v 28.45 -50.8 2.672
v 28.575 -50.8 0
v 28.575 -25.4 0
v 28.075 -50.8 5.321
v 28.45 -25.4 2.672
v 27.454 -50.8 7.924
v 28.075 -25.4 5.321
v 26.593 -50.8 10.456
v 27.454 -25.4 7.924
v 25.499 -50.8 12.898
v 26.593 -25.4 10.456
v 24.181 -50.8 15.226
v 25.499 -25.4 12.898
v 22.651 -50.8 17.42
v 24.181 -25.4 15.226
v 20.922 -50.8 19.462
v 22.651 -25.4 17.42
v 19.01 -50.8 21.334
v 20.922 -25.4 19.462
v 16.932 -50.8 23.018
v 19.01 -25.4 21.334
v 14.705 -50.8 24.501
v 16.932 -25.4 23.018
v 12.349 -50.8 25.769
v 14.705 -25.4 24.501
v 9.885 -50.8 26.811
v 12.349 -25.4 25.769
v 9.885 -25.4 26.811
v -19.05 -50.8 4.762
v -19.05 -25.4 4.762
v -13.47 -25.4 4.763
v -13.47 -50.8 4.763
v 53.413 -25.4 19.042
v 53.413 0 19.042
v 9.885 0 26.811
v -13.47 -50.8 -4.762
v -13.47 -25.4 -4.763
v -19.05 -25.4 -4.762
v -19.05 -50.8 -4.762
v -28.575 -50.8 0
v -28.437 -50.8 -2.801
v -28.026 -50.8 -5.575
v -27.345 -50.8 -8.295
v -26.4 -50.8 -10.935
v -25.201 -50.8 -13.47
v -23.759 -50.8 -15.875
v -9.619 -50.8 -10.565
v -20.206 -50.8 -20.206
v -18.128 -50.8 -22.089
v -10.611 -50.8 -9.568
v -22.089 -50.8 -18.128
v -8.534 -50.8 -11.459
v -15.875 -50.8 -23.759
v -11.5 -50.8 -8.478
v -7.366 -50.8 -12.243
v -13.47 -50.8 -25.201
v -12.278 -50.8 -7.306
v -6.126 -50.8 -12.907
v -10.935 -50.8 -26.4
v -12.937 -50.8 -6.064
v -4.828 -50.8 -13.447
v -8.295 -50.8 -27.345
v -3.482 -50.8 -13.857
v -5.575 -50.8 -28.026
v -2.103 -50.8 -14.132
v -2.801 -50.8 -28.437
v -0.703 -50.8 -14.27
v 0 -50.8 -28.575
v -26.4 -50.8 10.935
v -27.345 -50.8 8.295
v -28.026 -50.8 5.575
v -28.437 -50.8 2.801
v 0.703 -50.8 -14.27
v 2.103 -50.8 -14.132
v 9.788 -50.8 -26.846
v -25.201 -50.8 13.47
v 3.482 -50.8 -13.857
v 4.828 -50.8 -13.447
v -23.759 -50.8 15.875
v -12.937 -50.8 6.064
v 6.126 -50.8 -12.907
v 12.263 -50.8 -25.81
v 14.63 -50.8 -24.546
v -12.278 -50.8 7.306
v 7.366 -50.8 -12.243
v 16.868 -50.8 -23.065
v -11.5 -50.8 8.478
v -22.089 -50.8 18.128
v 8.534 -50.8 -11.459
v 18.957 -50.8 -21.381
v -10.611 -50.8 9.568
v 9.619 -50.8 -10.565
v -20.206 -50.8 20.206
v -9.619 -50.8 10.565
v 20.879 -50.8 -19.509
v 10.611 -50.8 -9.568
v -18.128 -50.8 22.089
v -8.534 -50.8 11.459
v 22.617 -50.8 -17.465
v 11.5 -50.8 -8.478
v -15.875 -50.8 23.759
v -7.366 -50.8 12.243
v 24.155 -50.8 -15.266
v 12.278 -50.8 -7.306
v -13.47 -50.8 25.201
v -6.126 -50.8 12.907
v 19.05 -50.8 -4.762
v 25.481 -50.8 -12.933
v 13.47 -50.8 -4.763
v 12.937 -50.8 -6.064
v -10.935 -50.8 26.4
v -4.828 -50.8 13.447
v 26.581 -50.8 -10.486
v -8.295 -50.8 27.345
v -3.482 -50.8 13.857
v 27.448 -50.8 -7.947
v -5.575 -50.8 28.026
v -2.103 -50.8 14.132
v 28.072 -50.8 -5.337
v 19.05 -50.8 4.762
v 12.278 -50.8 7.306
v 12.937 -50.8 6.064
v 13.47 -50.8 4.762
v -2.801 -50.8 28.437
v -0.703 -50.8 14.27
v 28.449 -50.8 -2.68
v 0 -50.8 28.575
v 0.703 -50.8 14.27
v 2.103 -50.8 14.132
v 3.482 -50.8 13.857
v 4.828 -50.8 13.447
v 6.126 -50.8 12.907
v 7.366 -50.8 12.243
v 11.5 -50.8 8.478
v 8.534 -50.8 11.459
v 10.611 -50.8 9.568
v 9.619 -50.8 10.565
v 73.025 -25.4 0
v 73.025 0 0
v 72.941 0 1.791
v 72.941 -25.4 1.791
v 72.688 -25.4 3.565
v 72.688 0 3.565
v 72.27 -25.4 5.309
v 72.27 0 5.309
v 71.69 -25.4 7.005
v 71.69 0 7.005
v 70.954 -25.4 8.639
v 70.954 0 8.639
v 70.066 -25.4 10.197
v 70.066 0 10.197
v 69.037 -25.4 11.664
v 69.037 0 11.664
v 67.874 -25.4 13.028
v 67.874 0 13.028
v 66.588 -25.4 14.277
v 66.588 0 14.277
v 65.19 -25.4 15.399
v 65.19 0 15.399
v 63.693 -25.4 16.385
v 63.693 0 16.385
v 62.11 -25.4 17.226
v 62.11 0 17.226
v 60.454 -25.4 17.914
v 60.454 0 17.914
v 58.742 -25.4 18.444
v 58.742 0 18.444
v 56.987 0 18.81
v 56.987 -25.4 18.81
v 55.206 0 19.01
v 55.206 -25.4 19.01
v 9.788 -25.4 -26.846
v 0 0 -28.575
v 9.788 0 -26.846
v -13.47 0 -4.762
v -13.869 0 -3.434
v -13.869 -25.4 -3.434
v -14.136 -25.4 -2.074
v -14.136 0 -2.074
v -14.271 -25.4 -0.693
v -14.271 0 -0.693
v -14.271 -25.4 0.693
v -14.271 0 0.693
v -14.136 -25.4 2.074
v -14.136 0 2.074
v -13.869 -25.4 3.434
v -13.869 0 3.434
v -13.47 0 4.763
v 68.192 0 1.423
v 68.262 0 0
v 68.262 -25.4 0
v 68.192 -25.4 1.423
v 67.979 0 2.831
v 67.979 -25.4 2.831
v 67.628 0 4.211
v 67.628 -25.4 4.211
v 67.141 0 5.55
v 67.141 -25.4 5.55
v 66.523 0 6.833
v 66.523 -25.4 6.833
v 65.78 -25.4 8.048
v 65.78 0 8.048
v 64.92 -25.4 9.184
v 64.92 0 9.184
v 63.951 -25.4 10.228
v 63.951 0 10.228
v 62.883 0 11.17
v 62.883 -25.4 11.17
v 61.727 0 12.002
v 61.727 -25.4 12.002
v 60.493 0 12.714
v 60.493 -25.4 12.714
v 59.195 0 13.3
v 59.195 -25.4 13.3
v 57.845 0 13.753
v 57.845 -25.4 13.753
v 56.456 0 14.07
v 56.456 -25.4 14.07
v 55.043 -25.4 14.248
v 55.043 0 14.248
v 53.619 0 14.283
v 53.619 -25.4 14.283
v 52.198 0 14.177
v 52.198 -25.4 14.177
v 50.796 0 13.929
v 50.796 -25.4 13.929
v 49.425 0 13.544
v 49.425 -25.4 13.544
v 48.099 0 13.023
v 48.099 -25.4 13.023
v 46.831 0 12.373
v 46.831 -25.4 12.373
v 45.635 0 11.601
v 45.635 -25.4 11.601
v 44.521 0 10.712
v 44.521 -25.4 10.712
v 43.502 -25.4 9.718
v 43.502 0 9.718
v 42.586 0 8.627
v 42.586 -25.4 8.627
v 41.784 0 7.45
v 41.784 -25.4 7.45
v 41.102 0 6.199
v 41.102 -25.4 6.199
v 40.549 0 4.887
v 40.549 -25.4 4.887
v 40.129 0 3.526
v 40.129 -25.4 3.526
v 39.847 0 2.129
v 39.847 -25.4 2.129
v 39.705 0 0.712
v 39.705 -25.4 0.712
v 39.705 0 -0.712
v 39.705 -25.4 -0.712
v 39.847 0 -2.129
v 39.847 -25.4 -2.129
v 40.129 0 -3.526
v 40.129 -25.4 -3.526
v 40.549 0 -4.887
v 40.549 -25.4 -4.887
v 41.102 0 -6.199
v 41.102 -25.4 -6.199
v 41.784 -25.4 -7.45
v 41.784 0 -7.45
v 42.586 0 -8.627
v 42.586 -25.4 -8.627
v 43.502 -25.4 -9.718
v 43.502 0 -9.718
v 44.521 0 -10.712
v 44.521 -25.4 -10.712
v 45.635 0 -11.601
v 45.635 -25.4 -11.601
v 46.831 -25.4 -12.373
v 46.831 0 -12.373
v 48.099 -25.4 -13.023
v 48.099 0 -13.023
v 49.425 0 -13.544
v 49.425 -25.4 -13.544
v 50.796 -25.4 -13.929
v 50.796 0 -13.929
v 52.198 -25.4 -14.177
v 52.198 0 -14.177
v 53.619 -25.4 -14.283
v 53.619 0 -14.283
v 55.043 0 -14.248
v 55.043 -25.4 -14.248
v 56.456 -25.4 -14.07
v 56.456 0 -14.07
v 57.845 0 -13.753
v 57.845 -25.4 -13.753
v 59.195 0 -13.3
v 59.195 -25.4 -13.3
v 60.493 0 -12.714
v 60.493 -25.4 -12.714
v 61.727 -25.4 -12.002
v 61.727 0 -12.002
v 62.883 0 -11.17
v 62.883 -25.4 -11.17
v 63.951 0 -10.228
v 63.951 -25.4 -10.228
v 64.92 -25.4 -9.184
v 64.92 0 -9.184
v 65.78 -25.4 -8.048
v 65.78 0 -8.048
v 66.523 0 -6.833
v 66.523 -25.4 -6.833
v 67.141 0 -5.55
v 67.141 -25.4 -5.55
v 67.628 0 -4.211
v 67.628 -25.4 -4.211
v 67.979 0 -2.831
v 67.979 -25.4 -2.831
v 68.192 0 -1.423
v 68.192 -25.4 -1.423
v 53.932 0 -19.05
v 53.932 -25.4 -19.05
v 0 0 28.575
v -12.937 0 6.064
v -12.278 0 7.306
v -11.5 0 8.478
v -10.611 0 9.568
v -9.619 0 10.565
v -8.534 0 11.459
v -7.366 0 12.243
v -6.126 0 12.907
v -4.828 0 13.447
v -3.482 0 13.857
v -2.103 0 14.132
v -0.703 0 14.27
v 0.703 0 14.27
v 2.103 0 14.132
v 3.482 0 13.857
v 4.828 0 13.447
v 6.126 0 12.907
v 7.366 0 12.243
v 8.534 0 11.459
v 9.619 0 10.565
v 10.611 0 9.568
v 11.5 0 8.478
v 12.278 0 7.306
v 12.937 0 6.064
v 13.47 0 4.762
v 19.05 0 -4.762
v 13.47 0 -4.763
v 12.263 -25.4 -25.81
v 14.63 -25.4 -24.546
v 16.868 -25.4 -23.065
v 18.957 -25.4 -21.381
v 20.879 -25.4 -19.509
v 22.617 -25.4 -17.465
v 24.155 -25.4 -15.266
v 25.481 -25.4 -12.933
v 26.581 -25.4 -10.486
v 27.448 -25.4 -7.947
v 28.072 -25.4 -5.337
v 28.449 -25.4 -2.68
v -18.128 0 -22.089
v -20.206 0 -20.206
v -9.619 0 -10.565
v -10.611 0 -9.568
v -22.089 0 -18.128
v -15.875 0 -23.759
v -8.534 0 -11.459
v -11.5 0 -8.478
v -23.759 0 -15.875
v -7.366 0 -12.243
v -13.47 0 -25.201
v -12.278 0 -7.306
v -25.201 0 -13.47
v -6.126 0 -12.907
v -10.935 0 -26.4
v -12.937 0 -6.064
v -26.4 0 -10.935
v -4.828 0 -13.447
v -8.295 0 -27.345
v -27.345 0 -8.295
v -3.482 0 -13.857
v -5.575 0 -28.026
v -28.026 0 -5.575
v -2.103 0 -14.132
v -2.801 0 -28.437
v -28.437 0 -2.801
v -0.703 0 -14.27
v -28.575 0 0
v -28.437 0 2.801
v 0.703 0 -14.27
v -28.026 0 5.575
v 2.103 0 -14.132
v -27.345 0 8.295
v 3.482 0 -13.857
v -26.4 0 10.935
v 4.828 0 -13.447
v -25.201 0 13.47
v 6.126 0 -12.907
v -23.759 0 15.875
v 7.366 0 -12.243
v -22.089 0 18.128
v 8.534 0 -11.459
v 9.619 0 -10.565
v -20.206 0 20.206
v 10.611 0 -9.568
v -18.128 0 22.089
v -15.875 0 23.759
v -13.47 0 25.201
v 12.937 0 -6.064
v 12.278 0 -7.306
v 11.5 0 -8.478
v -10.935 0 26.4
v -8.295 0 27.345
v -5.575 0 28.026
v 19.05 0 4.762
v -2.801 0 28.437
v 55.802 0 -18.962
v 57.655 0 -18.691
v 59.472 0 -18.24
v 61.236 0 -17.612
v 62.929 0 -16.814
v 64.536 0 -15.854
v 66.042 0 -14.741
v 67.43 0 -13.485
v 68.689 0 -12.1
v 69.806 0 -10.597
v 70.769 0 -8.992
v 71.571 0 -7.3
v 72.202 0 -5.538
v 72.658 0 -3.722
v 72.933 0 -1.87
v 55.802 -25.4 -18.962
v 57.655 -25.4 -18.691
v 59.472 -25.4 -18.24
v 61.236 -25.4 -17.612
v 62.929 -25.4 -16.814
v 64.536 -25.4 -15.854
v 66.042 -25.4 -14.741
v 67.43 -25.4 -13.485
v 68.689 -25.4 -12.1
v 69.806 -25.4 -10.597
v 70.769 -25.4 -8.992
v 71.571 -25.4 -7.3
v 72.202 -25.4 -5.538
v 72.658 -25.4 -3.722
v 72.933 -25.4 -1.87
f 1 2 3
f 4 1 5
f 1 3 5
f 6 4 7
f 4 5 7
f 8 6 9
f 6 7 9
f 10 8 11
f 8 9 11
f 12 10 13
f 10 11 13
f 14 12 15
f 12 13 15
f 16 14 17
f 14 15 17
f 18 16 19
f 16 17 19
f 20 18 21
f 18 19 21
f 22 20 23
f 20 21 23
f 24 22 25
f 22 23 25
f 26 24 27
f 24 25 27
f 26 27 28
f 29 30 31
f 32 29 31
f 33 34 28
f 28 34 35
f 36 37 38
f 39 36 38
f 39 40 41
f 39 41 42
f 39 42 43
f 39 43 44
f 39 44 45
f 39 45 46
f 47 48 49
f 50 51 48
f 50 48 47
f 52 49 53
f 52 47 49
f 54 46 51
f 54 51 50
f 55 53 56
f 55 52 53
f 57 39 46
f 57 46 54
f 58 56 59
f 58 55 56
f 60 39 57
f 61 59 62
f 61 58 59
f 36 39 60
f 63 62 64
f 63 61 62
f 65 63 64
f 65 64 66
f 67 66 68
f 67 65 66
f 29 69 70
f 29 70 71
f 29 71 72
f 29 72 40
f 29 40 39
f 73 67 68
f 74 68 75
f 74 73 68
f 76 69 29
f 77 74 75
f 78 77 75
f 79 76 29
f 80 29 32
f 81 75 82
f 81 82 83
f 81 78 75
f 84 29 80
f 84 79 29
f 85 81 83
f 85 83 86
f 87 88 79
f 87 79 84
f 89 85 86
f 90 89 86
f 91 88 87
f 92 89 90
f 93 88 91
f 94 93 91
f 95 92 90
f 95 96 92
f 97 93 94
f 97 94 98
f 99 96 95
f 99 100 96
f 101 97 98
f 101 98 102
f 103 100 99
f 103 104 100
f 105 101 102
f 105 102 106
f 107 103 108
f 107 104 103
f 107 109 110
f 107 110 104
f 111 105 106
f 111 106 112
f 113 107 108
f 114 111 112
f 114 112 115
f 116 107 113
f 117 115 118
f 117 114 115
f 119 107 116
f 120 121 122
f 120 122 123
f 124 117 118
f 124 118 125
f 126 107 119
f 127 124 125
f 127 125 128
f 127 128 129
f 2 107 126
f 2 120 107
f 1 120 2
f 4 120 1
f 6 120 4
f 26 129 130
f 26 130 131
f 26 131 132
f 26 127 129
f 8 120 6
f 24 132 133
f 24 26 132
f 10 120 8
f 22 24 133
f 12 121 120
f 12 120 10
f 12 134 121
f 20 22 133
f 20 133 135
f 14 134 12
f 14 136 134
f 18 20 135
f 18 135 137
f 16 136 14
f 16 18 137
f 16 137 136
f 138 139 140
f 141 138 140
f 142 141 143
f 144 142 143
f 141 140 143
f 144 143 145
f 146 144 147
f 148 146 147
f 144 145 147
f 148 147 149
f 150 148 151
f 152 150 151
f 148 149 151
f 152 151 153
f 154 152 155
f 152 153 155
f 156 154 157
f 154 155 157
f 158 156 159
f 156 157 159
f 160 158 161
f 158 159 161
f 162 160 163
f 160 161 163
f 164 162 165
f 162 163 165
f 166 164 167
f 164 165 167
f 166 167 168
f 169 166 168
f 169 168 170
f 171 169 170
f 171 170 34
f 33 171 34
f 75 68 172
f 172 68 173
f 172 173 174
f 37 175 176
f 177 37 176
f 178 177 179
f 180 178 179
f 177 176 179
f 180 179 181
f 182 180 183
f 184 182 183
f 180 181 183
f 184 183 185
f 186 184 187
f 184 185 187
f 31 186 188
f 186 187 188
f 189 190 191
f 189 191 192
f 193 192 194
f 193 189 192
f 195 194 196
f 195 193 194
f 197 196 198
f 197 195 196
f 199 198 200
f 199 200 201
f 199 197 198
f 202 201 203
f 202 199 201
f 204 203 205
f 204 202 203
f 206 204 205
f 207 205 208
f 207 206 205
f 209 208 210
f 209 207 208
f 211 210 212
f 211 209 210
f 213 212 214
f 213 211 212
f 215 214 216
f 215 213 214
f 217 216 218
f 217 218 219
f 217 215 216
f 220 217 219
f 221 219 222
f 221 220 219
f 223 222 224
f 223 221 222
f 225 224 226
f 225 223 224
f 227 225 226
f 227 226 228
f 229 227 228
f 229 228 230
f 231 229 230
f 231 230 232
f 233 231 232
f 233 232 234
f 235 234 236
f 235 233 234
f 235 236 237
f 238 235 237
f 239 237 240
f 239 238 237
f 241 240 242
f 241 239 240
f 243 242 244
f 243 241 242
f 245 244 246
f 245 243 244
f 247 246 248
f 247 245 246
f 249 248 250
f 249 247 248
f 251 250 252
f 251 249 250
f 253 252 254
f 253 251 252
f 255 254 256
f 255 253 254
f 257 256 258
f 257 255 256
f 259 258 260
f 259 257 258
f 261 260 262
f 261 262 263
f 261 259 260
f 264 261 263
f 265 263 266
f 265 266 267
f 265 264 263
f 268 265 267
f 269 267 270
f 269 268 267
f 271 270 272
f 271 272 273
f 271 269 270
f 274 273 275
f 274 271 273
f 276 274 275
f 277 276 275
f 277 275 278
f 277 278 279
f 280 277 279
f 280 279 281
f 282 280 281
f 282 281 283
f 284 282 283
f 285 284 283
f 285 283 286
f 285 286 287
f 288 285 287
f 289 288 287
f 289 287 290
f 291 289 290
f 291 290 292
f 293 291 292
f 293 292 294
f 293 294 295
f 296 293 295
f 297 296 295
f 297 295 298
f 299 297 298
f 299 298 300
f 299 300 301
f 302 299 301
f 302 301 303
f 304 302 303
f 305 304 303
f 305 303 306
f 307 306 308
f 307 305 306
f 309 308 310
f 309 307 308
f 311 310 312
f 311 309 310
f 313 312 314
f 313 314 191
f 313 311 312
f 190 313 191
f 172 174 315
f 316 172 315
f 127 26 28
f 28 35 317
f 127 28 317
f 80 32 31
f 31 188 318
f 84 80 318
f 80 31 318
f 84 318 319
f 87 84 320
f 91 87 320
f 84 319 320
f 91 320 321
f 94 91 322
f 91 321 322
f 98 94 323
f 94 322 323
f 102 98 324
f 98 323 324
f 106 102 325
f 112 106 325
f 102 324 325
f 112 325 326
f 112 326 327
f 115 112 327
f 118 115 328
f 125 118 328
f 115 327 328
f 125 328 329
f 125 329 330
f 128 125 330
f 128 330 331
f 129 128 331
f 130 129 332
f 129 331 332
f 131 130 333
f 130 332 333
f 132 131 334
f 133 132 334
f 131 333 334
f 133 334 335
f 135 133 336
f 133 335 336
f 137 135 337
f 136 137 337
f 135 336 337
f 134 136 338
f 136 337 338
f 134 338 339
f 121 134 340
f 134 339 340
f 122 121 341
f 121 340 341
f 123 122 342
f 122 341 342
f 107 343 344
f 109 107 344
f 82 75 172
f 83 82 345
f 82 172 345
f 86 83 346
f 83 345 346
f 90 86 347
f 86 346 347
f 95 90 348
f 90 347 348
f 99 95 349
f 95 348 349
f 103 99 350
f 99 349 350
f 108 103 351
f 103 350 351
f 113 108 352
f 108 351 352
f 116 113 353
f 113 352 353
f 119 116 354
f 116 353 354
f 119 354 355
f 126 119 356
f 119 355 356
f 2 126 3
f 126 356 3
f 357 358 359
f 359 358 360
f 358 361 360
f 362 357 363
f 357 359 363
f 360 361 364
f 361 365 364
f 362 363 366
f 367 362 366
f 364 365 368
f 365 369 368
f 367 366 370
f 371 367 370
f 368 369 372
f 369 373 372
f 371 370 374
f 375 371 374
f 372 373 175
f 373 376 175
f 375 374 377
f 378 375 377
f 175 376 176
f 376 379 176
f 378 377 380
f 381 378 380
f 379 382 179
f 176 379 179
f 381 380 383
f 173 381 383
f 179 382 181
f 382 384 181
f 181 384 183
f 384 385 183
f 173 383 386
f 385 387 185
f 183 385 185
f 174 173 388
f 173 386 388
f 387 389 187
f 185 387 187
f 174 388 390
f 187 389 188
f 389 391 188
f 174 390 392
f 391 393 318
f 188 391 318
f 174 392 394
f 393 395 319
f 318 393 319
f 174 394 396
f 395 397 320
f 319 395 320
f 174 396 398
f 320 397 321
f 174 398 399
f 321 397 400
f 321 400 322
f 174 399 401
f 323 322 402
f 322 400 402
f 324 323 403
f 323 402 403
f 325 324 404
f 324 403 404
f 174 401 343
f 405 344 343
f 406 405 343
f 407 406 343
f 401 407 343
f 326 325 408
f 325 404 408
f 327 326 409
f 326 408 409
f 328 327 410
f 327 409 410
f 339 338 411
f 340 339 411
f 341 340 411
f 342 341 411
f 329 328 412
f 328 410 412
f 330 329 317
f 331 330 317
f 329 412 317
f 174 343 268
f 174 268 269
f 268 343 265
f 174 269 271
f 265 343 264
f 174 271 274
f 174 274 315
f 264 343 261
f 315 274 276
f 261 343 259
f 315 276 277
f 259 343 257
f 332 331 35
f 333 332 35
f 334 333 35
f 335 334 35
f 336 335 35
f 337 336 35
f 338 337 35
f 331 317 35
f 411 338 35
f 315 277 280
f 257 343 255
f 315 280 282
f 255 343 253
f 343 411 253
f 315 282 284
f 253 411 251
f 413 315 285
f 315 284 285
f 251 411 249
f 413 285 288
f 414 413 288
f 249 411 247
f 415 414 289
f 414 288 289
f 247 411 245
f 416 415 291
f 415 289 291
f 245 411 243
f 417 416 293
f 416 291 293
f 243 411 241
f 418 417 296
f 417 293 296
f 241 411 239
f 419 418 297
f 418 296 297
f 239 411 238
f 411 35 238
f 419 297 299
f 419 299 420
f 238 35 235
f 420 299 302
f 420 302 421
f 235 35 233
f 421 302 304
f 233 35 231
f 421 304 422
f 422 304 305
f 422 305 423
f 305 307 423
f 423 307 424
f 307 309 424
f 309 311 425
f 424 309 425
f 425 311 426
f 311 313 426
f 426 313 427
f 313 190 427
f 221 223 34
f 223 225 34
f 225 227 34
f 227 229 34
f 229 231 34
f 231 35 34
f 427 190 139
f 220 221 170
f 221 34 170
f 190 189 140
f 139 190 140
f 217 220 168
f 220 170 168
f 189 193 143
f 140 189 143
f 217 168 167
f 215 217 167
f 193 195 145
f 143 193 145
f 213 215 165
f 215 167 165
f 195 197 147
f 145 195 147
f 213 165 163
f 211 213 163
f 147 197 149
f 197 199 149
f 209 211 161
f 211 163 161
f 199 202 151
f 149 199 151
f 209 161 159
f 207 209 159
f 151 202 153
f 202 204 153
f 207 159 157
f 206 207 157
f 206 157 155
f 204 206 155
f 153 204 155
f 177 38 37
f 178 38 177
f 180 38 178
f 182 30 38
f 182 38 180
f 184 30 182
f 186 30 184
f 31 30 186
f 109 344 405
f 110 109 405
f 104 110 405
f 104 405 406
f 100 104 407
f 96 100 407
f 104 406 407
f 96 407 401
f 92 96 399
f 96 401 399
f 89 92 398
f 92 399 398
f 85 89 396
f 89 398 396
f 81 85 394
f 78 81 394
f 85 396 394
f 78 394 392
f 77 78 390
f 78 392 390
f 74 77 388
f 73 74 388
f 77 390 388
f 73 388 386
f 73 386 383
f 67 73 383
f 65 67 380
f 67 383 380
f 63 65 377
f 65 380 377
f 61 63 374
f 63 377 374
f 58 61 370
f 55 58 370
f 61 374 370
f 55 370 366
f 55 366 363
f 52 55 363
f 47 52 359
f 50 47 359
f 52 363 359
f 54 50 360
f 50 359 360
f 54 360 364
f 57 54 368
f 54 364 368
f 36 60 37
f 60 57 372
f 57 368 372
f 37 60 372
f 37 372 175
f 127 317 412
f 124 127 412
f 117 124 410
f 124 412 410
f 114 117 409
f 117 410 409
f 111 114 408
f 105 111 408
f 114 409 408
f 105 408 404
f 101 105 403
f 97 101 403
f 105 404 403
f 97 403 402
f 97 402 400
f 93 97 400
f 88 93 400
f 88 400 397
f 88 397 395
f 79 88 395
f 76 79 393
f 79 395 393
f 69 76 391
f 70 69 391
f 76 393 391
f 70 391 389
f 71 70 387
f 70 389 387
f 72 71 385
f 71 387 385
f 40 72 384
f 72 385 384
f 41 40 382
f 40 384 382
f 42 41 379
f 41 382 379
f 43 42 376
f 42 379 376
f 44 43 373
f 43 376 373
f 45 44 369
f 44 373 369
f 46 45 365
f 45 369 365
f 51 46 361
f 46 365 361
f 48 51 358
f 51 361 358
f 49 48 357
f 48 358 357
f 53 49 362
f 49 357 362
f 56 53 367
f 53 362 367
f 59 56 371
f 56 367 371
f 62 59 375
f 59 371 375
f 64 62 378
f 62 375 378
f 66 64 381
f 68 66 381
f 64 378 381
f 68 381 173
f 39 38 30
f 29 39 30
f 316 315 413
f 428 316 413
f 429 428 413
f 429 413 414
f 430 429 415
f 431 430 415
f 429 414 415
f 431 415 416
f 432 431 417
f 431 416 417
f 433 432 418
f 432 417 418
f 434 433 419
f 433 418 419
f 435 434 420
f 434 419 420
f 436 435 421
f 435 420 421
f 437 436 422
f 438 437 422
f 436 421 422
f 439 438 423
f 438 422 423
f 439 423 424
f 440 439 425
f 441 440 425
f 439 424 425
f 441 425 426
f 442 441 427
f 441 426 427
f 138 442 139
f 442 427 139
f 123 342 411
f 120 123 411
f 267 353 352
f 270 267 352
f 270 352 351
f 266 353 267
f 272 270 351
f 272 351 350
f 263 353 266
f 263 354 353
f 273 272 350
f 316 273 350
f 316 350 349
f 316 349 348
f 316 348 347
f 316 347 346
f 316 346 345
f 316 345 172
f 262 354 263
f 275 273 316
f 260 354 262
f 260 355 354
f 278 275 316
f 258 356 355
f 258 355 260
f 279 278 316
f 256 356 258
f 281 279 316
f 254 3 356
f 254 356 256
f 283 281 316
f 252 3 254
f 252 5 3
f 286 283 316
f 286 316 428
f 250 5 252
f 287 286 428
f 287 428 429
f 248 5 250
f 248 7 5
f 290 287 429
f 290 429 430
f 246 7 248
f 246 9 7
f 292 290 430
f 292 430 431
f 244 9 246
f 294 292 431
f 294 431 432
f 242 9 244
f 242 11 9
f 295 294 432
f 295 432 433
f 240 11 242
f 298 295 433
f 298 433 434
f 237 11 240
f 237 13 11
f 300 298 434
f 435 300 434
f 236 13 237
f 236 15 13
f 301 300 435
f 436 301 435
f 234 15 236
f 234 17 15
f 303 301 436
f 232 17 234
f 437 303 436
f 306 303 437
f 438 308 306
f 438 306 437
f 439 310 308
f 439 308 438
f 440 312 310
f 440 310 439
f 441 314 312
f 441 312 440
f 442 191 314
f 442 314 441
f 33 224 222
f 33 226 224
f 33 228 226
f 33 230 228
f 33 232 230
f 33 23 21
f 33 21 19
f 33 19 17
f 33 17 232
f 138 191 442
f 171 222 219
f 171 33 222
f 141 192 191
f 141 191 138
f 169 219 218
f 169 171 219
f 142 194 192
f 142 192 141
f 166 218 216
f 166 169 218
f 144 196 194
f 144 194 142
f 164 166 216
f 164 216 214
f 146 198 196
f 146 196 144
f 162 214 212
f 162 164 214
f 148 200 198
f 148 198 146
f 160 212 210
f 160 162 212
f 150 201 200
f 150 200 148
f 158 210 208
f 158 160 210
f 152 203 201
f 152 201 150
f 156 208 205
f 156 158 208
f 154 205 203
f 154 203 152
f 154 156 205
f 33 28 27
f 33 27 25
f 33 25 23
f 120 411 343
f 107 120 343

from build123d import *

# Parameters (mm, degrees)
F0_R     = 14.2875
F1_DEPTH = 25.4
F2_DEPTH = 50.8


with BuildPart() as f1:
    # F0 (on Front) → F1 (new body)
    with BuildSketch(Plane.XZ):
        with BuildLine():
            Line((9.8852824268, 26.8106660929), (0, 28.575))
            ThreePointArc((0, 28.575), (-28.575, 0), (0, -28.575))
            Line((0, -28.575), (9.7880218685, -26.8463266184))
            ThreePointArc((9.7880218685, -26.8463266184), (23.4117849586, -16.3834962707), (28.575, 0))
            ThreePointArc((28.575, 0), (23.4414437519, 16.3410323978), (9.8852824268, 26.8106660929))
        make_face()
        with BuildLine():
            ThreePointArc((-13.4703841816, 4.7625), (0, 14.2875), (13.4703841816, 4.7625))
            Line((13.4703841816, 4.7625), (19.05, 4.7625))
            Line((19.05, 4.7625), (19.05, -4.7625))
            Line((19.05, -4.7625), (13.4703841816, -4.7625))
            ThreePointArc((13.4703841816, -4.7625), (0, -14.2875), (-13.4703841816, -4.7625))
            Line((-13.4703841816, -4.7625), (-19.05, -4.7625))
            Line((-19.05, -4.7625), (-19.05, 4.7625))
            Line((-19.05, 4.7625), (-13.4703841816, 4.7625))
        make_face(mode=Mode.SUBTRACT)
        with BuildLine():
            Line((53.4134443953, 19.0417214375), (9.8852824268, 26.8106660929))
            ThreePointArc((9.8852824268, 26.8106660929), (23.4414437519, 16.3410323978), (28.575, 0))
            ThreePointArc((28.575, 0), (23.4117849586, -16.3834962707), (9.7880218685, -26.8463266184))
            Line((9.7880218685, -26.8463266184), (53.9323258703, -19.0499522025))
            ThreePointArc((53.9323258703, -19.0499522025), (34.9267671799, -0.2594733756), (53.4134443953, 19.0417214375))
        make_face()
        with BuildLine():
            ThreePointArc((73.025, 0), (67.2453591837, 13.6674821066), (53.4134443953, 19.0417214375))
            ThreePointArc((53.4134443953, 19.0417214375), (34.9267671799, -0.2594733756), (53.9323258703, -19.0499522025))
            ThreePointArc((53.9323258703, -19.0499522025), (67.4302881394, -13.4854633248), (73.025, 0))
        make_face()
        with Locations((53.975, 0)):
            Circle(F0_R, mode=Mode.SUBTRACT)
        with BuildLine():
            ThreePointArc((-13.4703841816, -4.7625), (-14.2875, 0), (-13.4703841816, 4.7625))
            Line((-13.4703841816, 4.7625), (-19.05, 4.7625))
            Line((-19.05, 4.7625), (-19.05, -4.7625))
            Line((-19.05, -4.7625), (-13.4703841816, -4.7625))
        make_face()
    extrude(amount=F1_DEPTH)

    # F0 (on Front) → F2 (join)
    with BuildSketch(Plane.XZ):
        with BuildLine():
            Line((9.8852824268, 26.8106660929), (0, 28.575))
            ThreePointArc((0, 28.575), (-28.575, 0), (0, -28.575))
            Line((0, -28.575), (9.7880218685, -26.8463266184))
            ThreePointArc((9.7880218685, -26.8463266184), (23.4117849586, -16.3834962707), (28.575, 0))
            ThreePointArc((28.575, 0), (23.4414437519, 16.3410323978), (9.8852824268, 26.8106660929))
        make_face()
        with BuildLine():
            ThreePointArc((-13.4703841816, 4.7625), (0, 14.2875), (13.4703841816, 4.7625))
            Line((13.4703841816, 4.7625), (19.05, 4.7625))
            Line((19.05, 4.7625), (19.05, -4.7625))
            Line((19.05, -4.7625), (13.4703841816, -4.7625))
            ThreePointArc((13.4703841816, -4.7625), (0, -14.2875), (-13.4703841816, -4.7625))
            Line((-13.4703841816, -4.7625), (-19.05, -4.7625))
            Line((-19.05, -4.7625), (-19.05, 4.7625))
            Line((-19.05, 4.7625), (-13.4703841816, 4.7625))
        make_face(mode=Mode.SUBTRACT)
    extrude(amount=F2_DEPTH)


solid = f1.part
